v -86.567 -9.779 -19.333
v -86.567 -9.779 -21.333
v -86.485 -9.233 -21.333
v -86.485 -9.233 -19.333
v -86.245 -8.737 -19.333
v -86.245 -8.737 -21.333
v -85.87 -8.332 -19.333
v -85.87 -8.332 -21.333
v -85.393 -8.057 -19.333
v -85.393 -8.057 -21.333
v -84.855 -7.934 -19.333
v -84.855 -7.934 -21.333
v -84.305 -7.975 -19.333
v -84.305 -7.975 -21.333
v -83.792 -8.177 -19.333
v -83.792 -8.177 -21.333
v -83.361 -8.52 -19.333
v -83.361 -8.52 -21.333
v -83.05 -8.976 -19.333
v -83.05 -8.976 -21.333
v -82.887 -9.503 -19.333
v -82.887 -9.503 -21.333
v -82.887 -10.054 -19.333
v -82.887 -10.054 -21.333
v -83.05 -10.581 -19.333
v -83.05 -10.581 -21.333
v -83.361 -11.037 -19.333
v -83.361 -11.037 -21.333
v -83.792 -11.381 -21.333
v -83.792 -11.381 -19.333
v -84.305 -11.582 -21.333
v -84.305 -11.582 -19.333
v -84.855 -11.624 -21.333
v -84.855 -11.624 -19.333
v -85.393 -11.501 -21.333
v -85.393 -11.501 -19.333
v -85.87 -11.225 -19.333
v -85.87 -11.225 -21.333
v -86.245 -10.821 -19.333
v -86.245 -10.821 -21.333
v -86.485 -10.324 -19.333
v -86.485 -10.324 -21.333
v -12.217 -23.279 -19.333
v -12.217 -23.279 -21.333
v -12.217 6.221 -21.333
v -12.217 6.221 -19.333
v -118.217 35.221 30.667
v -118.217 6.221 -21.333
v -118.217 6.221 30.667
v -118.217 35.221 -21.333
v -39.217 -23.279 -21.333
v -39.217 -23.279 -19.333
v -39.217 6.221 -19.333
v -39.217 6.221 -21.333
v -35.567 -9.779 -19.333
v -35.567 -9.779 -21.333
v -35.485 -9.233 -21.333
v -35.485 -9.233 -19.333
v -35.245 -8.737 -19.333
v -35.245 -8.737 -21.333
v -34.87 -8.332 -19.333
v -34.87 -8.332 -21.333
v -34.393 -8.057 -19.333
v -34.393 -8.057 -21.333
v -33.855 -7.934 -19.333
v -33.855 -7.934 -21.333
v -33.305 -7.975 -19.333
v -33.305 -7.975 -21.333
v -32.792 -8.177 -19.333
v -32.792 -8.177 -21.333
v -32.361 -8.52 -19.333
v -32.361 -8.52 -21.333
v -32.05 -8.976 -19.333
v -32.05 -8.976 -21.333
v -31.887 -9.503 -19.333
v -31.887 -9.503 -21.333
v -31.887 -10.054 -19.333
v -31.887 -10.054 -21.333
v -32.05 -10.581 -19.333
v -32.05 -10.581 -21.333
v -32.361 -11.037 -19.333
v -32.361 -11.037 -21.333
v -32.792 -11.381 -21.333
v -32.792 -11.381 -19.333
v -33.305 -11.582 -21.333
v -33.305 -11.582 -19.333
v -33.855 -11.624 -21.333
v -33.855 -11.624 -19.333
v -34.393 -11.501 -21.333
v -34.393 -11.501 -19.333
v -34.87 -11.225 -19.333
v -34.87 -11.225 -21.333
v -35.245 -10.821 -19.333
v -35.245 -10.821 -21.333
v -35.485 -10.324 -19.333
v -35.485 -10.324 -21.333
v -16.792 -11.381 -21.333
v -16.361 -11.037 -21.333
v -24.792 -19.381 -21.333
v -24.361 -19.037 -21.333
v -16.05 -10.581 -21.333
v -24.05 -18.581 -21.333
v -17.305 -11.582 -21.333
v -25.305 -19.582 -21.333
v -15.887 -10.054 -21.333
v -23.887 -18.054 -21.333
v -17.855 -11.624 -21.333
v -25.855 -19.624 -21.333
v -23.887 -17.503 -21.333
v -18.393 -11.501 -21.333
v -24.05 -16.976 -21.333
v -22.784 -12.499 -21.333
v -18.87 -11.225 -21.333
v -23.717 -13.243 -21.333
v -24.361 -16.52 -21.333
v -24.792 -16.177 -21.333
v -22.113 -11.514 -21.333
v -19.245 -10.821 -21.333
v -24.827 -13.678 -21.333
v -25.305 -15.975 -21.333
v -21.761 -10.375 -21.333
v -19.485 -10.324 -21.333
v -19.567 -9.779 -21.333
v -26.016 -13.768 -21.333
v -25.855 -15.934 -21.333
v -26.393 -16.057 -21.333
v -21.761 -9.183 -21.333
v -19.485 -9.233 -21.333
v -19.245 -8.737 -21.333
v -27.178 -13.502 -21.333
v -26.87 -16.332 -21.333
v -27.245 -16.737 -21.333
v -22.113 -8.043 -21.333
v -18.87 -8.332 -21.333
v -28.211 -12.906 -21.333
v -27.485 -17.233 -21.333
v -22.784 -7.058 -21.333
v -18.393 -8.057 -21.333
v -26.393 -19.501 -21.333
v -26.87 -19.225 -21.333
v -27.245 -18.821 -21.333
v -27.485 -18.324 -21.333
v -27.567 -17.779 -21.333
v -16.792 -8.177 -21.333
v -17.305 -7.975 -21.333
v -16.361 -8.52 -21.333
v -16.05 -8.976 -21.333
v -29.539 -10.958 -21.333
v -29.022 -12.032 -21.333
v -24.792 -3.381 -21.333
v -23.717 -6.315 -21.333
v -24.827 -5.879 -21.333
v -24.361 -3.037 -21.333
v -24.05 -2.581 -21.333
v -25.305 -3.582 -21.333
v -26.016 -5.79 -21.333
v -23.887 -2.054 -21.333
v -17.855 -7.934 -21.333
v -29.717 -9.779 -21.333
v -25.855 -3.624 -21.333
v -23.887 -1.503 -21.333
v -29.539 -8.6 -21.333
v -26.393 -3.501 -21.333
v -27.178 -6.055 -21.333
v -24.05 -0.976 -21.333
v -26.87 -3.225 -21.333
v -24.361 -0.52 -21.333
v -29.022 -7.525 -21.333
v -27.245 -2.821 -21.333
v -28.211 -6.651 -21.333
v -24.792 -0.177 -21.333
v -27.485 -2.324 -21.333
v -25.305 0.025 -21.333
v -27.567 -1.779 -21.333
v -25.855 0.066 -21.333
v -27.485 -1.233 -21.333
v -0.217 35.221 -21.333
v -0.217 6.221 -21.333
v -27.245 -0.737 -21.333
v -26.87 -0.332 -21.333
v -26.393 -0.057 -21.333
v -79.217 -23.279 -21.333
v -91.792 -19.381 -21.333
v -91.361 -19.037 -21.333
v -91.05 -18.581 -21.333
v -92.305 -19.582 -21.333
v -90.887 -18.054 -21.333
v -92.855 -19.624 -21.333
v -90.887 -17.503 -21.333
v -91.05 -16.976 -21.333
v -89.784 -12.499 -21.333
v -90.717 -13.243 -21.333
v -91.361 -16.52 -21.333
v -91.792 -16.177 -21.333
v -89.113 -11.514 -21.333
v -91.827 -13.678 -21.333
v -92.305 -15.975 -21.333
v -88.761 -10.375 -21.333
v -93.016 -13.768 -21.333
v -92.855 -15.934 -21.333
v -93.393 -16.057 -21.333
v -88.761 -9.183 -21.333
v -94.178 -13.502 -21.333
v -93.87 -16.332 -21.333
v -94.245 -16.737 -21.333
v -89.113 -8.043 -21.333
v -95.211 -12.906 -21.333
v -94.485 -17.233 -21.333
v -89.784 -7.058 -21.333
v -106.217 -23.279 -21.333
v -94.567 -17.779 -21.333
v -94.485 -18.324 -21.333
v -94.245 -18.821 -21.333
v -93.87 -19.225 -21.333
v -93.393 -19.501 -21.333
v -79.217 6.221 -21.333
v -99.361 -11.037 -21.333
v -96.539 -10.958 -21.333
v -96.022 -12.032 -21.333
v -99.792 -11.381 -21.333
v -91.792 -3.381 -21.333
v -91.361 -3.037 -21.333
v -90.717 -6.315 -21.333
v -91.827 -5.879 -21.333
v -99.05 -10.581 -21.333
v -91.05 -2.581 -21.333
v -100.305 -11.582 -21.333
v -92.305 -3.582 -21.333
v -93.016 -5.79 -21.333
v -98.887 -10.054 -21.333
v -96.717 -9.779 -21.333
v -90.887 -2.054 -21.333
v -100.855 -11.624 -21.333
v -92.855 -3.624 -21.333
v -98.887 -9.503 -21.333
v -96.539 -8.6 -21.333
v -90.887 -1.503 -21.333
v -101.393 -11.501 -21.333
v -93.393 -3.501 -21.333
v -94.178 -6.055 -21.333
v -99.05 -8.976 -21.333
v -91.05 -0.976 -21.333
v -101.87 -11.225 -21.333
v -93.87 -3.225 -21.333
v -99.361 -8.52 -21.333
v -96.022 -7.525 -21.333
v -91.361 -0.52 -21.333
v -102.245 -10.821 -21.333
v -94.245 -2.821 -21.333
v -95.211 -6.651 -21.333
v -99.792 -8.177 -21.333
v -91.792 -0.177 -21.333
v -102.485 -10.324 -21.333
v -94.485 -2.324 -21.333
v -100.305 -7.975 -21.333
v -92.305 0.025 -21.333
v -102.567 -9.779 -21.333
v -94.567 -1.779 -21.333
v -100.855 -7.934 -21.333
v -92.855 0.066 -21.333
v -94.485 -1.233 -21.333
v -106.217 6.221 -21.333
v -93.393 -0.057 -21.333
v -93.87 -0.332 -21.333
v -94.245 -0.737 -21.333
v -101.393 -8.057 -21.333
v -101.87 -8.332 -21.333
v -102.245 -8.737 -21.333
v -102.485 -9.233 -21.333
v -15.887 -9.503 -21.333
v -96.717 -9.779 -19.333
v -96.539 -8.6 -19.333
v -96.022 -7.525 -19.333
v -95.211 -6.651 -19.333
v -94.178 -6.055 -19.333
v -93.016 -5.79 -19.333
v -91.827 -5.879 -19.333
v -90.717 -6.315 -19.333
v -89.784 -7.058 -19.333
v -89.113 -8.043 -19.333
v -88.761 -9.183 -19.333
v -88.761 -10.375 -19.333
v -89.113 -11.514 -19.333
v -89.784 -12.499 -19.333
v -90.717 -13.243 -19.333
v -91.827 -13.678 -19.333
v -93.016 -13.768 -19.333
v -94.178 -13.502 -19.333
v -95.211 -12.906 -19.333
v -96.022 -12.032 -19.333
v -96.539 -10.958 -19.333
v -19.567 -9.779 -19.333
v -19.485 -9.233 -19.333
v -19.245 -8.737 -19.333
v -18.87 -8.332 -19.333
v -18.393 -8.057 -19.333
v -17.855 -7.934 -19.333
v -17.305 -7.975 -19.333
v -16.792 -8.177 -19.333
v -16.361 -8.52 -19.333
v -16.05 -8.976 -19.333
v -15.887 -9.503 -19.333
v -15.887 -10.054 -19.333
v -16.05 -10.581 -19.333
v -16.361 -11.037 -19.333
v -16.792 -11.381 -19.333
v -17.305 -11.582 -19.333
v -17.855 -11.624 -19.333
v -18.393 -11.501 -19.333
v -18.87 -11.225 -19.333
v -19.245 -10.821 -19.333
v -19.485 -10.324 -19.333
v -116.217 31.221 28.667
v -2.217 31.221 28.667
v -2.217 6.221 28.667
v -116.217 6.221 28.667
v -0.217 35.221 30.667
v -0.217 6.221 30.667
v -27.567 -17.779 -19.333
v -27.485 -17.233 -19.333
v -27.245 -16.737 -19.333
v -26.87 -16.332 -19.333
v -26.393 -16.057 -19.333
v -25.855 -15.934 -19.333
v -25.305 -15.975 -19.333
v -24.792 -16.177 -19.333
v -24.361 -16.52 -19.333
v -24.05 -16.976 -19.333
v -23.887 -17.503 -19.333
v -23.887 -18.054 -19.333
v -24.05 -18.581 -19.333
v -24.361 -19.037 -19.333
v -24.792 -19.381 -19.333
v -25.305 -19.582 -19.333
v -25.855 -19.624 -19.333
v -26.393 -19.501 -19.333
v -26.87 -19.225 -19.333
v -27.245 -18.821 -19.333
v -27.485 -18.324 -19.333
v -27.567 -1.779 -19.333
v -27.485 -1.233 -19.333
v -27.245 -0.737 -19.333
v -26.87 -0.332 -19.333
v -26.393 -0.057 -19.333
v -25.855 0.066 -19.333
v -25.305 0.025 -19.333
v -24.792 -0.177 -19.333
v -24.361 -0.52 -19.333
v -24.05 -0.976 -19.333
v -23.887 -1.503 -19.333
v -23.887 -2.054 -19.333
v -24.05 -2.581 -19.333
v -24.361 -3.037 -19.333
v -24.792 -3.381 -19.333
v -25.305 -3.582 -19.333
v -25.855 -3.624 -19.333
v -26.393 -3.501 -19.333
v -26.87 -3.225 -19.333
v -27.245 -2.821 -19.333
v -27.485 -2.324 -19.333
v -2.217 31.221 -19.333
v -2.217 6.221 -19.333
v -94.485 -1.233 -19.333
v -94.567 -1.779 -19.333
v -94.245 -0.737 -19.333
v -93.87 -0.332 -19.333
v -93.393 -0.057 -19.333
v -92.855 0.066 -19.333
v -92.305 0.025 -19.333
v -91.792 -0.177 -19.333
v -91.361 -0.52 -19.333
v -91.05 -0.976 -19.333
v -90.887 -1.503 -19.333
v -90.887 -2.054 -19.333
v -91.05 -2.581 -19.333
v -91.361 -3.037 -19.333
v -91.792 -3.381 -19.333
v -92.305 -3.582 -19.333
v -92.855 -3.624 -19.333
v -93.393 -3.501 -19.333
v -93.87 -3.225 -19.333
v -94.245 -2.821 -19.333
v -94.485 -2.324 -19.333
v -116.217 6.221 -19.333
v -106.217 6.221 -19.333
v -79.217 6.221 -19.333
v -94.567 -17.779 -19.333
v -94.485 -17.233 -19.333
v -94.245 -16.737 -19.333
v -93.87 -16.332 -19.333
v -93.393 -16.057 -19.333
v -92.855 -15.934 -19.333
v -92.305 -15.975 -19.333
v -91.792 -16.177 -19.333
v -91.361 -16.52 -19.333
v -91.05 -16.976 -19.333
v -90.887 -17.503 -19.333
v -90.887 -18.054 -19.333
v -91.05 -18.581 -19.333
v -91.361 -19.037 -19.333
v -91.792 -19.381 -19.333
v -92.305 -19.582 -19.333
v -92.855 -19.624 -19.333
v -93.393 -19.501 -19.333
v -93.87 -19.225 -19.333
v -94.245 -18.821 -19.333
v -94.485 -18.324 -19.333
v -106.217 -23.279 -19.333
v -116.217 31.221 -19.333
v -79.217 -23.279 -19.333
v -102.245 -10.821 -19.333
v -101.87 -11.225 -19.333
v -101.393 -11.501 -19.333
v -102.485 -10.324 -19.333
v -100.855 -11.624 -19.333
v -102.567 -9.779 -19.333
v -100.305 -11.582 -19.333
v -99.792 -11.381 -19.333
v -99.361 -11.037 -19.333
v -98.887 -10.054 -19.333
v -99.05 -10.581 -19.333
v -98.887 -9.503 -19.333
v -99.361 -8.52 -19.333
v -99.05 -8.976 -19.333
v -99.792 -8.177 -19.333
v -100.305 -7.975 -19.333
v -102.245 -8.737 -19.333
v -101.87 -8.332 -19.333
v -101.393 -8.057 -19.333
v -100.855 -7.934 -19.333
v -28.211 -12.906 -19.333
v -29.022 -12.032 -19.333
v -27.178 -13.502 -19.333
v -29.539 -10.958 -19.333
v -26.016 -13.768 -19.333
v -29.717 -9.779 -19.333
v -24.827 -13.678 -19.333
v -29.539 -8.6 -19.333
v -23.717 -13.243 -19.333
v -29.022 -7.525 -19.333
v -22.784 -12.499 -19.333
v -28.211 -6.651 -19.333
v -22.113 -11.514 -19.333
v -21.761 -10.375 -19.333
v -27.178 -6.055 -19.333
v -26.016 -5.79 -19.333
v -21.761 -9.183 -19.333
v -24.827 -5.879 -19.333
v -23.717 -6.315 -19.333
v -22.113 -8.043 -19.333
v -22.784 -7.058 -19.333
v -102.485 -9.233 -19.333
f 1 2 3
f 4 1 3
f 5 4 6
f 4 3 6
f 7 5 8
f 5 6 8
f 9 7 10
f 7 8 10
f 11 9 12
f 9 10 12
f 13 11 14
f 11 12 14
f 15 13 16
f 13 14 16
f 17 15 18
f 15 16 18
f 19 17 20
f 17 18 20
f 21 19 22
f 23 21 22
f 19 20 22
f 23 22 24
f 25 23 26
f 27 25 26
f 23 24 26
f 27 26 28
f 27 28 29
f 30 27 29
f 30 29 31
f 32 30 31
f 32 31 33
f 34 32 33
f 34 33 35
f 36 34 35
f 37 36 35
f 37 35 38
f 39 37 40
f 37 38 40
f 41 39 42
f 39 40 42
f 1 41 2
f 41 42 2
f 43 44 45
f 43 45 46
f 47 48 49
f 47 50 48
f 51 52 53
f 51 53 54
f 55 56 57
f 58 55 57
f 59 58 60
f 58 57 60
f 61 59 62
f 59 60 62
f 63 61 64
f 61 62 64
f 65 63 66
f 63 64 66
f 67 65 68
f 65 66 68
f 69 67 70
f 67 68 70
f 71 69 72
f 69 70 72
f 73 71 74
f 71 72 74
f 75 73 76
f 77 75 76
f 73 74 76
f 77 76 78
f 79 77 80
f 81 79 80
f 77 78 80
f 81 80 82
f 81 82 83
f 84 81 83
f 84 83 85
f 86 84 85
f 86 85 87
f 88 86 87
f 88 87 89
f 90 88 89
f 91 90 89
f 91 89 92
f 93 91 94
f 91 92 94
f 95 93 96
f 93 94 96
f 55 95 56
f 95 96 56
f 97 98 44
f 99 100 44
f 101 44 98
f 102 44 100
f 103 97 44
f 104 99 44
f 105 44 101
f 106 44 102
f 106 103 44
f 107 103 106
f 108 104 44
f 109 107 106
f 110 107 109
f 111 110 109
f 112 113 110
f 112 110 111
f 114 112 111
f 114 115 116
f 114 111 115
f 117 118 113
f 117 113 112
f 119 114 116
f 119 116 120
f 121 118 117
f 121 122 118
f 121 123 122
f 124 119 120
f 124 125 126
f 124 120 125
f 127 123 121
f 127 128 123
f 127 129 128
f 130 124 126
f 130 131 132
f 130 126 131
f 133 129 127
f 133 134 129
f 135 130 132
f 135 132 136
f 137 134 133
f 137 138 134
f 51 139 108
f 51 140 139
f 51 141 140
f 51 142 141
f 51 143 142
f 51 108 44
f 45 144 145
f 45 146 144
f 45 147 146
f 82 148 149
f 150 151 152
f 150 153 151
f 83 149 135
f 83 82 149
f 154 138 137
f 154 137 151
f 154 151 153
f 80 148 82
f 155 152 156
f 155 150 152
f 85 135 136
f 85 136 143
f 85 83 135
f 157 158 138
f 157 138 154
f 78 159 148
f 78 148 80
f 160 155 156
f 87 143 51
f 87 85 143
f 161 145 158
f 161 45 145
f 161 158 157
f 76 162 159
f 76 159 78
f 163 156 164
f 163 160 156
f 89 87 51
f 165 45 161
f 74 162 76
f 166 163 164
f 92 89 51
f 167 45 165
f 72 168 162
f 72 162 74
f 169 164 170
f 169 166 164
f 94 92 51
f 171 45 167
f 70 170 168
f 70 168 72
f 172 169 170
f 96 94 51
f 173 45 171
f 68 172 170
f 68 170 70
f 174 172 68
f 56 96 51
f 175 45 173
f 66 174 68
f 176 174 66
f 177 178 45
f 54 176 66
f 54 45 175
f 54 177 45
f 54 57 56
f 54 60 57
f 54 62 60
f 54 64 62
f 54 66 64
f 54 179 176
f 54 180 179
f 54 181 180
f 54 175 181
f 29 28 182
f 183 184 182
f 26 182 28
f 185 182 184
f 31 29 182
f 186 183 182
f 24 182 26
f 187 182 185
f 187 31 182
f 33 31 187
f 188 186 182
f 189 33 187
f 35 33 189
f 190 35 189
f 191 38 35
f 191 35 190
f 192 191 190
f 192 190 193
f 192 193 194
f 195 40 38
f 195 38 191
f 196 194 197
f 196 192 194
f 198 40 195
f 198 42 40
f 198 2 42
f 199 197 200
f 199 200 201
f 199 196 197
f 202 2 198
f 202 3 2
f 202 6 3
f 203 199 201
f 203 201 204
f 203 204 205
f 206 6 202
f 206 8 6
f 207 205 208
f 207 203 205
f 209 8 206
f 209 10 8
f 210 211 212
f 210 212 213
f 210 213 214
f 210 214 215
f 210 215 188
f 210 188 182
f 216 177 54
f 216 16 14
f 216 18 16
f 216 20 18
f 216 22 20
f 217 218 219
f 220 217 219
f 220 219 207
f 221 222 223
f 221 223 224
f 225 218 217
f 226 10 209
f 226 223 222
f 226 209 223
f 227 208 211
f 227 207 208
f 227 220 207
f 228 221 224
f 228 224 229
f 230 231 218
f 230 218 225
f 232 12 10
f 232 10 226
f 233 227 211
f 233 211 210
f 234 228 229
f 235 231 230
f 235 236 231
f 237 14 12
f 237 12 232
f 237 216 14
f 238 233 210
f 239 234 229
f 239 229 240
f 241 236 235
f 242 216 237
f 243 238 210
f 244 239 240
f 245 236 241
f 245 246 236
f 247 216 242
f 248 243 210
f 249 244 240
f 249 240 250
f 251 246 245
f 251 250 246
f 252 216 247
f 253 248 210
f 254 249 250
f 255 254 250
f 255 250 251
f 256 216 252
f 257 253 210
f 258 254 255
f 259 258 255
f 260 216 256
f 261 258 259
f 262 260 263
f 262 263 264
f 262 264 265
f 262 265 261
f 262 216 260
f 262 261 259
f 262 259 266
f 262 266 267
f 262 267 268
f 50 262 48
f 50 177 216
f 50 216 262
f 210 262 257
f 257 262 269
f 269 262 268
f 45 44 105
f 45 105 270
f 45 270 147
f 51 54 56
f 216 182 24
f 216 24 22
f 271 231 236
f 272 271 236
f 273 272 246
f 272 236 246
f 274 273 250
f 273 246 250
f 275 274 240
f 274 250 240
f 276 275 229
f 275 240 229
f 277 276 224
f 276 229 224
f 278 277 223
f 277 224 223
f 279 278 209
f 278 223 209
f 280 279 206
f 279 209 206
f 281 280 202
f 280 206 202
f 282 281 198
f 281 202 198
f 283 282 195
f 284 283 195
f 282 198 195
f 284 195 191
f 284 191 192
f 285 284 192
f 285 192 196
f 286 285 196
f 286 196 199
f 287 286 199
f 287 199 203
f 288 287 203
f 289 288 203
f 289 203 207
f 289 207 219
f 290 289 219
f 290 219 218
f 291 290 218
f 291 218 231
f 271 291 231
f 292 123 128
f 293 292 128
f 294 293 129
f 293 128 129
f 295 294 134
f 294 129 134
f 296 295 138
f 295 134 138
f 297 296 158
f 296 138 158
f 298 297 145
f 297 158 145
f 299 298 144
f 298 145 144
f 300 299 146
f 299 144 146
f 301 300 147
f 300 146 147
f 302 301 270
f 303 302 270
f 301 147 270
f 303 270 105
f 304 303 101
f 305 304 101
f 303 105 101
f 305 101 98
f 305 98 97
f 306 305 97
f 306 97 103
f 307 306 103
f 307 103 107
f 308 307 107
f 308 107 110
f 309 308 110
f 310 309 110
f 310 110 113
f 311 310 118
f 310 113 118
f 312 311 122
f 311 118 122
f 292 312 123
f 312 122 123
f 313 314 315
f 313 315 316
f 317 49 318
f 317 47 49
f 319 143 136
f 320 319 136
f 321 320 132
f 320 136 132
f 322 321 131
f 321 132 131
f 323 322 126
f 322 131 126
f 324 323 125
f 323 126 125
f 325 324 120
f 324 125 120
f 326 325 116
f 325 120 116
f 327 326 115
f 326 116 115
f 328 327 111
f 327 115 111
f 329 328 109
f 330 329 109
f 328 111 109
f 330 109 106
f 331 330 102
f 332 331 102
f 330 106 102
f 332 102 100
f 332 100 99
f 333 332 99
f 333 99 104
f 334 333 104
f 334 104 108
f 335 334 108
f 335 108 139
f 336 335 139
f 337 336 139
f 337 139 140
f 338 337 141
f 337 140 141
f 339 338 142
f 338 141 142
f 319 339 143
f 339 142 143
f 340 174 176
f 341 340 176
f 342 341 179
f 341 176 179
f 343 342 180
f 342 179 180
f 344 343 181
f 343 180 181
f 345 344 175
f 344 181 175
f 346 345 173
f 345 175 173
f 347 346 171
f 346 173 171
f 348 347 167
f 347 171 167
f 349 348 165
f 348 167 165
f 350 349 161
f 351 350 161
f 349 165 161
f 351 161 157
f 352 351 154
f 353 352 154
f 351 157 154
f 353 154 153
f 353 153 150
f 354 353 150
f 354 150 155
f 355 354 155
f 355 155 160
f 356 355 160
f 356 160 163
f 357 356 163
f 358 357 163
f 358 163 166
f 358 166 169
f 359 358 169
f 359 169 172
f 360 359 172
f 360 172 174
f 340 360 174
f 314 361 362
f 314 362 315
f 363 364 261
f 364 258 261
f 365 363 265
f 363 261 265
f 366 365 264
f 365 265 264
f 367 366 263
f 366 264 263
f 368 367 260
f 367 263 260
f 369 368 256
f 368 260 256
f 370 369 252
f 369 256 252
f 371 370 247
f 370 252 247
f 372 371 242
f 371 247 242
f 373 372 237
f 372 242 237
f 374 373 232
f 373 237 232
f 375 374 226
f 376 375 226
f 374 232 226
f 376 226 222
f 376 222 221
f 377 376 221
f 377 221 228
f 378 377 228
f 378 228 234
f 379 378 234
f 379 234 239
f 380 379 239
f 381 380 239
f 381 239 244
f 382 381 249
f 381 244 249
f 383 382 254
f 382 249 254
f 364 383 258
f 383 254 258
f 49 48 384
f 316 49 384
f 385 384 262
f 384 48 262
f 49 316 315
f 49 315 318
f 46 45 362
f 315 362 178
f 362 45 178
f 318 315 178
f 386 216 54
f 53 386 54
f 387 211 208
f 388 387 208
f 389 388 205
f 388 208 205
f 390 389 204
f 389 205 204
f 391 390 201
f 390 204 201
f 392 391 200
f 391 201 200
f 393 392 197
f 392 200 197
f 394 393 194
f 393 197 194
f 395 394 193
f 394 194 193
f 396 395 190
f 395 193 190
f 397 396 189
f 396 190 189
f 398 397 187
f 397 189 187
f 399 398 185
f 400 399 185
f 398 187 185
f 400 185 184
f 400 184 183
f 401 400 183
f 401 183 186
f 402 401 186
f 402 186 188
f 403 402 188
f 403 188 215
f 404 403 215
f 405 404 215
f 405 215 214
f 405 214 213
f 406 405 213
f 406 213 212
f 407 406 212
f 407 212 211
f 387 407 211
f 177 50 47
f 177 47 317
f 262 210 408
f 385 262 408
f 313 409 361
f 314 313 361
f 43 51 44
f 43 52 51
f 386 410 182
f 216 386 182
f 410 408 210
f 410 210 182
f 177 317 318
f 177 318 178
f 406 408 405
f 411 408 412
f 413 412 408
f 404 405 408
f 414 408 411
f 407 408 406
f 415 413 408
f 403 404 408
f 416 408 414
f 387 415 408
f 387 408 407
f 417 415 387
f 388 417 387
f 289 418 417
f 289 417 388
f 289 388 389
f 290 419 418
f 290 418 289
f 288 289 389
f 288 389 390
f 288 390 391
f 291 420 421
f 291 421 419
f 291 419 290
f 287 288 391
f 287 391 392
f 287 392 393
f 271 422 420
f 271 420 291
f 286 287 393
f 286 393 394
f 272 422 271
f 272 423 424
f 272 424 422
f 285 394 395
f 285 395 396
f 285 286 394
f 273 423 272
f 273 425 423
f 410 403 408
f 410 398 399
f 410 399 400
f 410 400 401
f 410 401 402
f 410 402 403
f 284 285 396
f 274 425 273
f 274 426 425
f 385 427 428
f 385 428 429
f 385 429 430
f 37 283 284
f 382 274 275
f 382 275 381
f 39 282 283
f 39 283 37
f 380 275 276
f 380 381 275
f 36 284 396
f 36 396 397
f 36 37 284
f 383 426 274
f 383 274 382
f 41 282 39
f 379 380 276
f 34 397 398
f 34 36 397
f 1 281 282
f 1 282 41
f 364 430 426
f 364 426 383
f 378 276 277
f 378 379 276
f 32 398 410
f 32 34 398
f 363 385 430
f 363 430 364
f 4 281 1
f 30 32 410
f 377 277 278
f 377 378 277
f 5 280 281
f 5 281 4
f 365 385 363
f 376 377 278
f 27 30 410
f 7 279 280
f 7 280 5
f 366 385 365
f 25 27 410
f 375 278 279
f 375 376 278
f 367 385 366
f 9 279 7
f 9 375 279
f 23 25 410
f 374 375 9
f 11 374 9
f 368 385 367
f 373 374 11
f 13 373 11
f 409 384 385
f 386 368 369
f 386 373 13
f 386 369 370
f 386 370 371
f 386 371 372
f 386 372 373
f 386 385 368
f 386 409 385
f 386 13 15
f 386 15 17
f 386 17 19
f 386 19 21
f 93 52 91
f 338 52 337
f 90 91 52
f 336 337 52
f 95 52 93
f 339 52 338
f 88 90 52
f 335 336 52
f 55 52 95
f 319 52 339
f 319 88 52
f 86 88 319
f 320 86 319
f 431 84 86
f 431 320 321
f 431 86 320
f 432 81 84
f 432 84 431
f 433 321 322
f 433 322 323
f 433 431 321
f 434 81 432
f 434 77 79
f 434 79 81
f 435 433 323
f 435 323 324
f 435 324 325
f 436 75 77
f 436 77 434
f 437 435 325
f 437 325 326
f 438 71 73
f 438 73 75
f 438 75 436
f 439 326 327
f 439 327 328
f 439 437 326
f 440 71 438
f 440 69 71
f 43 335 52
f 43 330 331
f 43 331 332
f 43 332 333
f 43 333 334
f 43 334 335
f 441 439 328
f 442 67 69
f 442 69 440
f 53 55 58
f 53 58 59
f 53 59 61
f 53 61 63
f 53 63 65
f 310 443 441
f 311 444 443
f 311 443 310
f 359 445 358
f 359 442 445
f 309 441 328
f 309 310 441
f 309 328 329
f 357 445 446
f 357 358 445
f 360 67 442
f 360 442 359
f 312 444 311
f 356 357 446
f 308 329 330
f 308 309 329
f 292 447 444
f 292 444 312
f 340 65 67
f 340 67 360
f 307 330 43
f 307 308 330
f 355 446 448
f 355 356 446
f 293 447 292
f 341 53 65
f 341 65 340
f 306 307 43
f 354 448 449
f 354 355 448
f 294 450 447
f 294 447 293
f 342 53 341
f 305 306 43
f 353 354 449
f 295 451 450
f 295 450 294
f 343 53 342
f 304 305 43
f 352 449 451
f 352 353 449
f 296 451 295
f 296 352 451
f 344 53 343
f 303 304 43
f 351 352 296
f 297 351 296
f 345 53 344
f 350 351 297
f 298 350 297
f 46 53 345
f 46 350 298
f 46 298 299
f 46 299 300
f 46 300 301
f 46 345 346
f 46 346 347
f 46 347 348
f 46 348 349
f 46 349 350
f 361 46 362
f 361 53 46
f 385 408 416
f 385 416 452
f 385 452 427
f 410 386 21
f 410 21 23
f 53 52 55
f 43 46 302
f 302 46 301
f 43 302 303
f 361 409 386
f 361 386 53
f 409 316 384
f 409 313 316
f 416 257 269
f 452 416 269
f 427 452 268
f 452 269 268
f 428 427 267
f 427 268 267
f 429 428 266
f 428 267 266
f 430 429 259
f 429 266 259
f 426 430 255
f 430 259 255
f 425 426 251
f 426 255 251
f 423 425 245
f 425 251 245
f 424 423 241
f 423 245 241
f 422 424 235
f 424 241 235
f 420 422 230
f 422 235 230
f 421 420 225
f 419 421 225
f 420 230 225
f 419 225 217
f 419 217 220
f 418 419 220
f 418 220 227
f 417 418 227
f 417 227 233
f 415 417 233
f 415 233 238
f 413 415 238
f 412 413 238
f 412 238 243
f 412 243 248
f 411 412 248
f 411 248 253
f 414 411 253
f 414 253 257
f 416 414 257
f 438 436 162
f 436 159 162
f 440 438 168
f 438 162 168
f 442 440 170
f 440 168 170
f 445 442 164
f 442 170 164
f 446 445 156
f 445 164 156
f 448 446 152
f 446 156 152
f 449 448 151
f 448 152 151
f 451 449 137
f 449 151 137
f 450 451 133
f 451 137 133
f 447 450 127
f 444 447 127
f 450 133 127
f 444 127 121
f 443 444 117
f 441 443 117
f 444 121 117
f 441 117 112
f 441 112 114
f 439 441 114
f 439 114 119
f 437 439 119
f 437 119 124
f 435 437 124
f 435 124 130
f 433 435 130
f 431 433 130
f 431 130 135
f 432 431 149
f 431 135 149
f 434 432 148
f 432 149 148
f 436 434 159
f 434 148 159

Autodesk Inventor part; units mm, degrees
ref_plane "YZ Plane" through (0, 0, 0) normal (1, 0, 0) x (0, 1, 0)
ref_plane "XZ Plane" through (0, 0, 0) normal (0, 1, 0) x (-1, 0, 0)
ref_plane "XY Plane" through (0, 0, 0) normal (0, 0, 1) x (1, 0, 0)
ref_plane "Work Plane7" through (-37.2167, 31.2213, -6.3329) normal (0, 1, 0) x (1, 0, 0)
sketch "Sketch1" plane through (-37.2167, 31.2213, -6.3329) normal (0, 1, 0) x (1, 0, 0)
  arc A0 (-58.7242, 8.25) -> (-74.6429, -6.8045) centre (-66, 0) ccw projected
  line L0 (-77, 0) -> (-77, -32.6485)
  arc A1 (-74.6429, -15.1955) -> (-58.7242, -30.25) centre (-66, -22) ccw projected
  line L1 (-66, -33) -> (-77, -33)
  line L2 (-77, -32.6485) -> (-77, -33)
  line L3 (-77, 0) -> (-77, 11)
  arc A2 (30, -7.5498) -> (14.7242, 8.25) centre (22, 0) ccw projected
  line L4 (22, 11) -> (-77, 11)
  line L5 (-66, -33) -> (33, -33)
  arc A3 (14.7242, -30.25) -> (30, -14.4502) centre (22, -22) ccw projected
  line L6 (33, -22) -> (33, -33)
  line L7 (33, -22) -> (33, 11)
  line L8 (22, 11) -> (33, 11)
  line L9 (-79, -32.6485) -> (-79, 0)
  line L10 (-79, 0) -> (-79, 13)
  line L11 (-79, 13) -> (22, 13)
  line L12 (22, 13) -> (35, 13)
  line L13 (35, 13) -> (35, -22)
  line L14 (35, -22) -> (35, -35)
  line L15 (35, -35) -> (-66, -35)
  line L16 (-66, -35) -> (-79, -35)
  line L17 (-79, -35) -> (-79, -32.6485)
  line L18 (-81, 15) -> (-81, 0)
  line L19 (-81, 0) -> (-81, -32.6485)
  line L20 (-81, -32.6485) -> (-81, -37)
  line L21 (-81, -37) -> (-66, -37)
  line L22 (-66, -37) -> (37, -37)
  line L23 (37, -37) -> (37, -22)
  line L24 (37, -22) -> (37, 15)
  line L25 (37, 15) -> (22, 15)
  line L26 (22, 15) -> (-81, 15)
  point P0 (37.2167, -6.3329)
  dimension "d0" = 2
  dimension "d1" = 4
extrude "Extrusion1" add sketch "Sketch1" against normal blind 25 contours L26 L25 L24 L23 L22 L21 L20 L19 L18
extrude "Extrusion2" add sketch "Sketch1" along normal blind 4 contours L4 A2 L7 A3 L5 A1 L0 A0 | A0 L3 L4 | L8 L7 A2 | A1 L1 L2 L0 | L6 L5 A3 | L9 L10 L11 L12 L13 L14 L15 L16 L17 | L26 L25 L24 L23 L22 L21 L20 L19 L18
sketch "Sketch3" plane through (-118.2167, 6.2213, 30.6671) normal (0, 0, 1) x (1, 0, 0)
  point P0 (118.2167, -6.2213)
sketch "Sketch4" plane through (-118.2167, 6.2213, 30.6671) normal (0, 0, 1) x (1, 0, 0)
  point P0 (118.2167, -6.2213)
ref_plane "Work Plane2" through (-37.2167, 6.2213, -6.3329) normal (0, -1, 0) x (1, 0, 0)
sketch "Sketch5" plane through (-37.2167, 6.2213, -6.3329) normal (0, -1, 0) x (1, 0, 0)
  line L0 (35, -13) -> (-79, -13) projected
  line L1 (35, -13) -> (35, -15)
  line L2 (-81, -15) -> (37, -15) projected
  line L3 (-79, 35) -> (-79, -13) projected
  line L4 (-79, -13) -> (-79, -15)
  line L5 (-79, -15) -> (35, -15)
  line L6 (35, -15) -> (25, -15)
  line L7 (25, -15) -> (25, -13)
  line L8 (25, -13) -> (-2, -13)
  line L9 (-2, -13) -> (-2, -15)
  line L10 (25, -15) -> (-2, -15)
  line L11 (-79, -15) -> (-69, -15)
  line L12 (-69, -15) -> (-69, -13)
  line L13 (-69, -13) -> (-42, -13)
  line L14 (-42, -13) -> (-42, -15)
  line L15 (-69, -15) -> (-42, -15)
  point P0 (37.2167, 6.3329)
  point P1 (-2, -15)
  point P2 (25, -15)
  point P3 (-42, -15)
  point P4 (-69, -15)
  dimension "d30" = 10
  dimension "d31" = 27
  dimension "d32" = 10
  dimension "d33" = 27
extrude "Extrusion3" add sketch "Sketch5" along normal blind 29.5 contours L7 L2 L9 L0 | L14 L2 L12 L0
ref_plane "Work Plane3" through (-0.2167, 35.2213, -21.3329) normal (0, 0, -1) x (-1, 0, 0)
sketch "Sketch6" plane through (-0.2167, 35.2213, -21.3329) normal (0, 0, -1) x (-1, 0, 0)
  line L0 (106, -58.5) -> (79, -58.5) projected
  line L1 (106, -58.5) -> (92.5, -58.5)
  line L2 (92.5, -58.5) -> (92.5, -53)
  circle A0 centre (92.5, -53) radius 1.85
  line L3 (92.5, -53) -> (92.5, -45)
  circle A1 centre (92.5, -45) radius 4
  line L4 (92.5, -45) -> (92.5, -37)
  circle A2 centre (92.5, -37) radius 1.85
  line L5 (92.5, -45) -> (84.5, -45)
  line L6 (93.7399, -45) -> (90.2601, -45) projected
  line L7 (84.5, -45) -> (100.5, -45)
  circle A3 centre (100.5, -45) radius 1.85
  circle A4 centre (84.5, -45) radius 1.85
  line L8 (79, -29) -> (39, -29) projected
  line L9 (79, -29) -> (59, -29)
  line L10 (59, -29) -> (59, -58.5)
  circle A5 centre (25.5, -53) radius 1.85
  circle A6 centre (25.5, -45) radius 4
  circle A7 centre (25.5, -37) radius 1.85
  circle A8 centre (17.5, -45) radius 1.85
  circle A9 centre (33.5, -45) radius 1.85
  point P0 (-0.2167, -35.2213)
  dimension "d36" = 5.5
  dimension "d37" = 3.7
  dimension "d38" = 8
  dimension "d39" = 8
  dimension "d40" = 8
  dimension "d41" = 3.7
  dimension "d42" = 8
  dimension "d43" = 16
  dimension "d44" = 3.7
  dimension "d45" = 3.7
  dimension "d46" = 20
extrude "Extrusion4" cut sketch "Sketch6" against normal blind 2.25
properties part number "39057 TETRIX 12V 3000mAH Battery Pack Assembly"
